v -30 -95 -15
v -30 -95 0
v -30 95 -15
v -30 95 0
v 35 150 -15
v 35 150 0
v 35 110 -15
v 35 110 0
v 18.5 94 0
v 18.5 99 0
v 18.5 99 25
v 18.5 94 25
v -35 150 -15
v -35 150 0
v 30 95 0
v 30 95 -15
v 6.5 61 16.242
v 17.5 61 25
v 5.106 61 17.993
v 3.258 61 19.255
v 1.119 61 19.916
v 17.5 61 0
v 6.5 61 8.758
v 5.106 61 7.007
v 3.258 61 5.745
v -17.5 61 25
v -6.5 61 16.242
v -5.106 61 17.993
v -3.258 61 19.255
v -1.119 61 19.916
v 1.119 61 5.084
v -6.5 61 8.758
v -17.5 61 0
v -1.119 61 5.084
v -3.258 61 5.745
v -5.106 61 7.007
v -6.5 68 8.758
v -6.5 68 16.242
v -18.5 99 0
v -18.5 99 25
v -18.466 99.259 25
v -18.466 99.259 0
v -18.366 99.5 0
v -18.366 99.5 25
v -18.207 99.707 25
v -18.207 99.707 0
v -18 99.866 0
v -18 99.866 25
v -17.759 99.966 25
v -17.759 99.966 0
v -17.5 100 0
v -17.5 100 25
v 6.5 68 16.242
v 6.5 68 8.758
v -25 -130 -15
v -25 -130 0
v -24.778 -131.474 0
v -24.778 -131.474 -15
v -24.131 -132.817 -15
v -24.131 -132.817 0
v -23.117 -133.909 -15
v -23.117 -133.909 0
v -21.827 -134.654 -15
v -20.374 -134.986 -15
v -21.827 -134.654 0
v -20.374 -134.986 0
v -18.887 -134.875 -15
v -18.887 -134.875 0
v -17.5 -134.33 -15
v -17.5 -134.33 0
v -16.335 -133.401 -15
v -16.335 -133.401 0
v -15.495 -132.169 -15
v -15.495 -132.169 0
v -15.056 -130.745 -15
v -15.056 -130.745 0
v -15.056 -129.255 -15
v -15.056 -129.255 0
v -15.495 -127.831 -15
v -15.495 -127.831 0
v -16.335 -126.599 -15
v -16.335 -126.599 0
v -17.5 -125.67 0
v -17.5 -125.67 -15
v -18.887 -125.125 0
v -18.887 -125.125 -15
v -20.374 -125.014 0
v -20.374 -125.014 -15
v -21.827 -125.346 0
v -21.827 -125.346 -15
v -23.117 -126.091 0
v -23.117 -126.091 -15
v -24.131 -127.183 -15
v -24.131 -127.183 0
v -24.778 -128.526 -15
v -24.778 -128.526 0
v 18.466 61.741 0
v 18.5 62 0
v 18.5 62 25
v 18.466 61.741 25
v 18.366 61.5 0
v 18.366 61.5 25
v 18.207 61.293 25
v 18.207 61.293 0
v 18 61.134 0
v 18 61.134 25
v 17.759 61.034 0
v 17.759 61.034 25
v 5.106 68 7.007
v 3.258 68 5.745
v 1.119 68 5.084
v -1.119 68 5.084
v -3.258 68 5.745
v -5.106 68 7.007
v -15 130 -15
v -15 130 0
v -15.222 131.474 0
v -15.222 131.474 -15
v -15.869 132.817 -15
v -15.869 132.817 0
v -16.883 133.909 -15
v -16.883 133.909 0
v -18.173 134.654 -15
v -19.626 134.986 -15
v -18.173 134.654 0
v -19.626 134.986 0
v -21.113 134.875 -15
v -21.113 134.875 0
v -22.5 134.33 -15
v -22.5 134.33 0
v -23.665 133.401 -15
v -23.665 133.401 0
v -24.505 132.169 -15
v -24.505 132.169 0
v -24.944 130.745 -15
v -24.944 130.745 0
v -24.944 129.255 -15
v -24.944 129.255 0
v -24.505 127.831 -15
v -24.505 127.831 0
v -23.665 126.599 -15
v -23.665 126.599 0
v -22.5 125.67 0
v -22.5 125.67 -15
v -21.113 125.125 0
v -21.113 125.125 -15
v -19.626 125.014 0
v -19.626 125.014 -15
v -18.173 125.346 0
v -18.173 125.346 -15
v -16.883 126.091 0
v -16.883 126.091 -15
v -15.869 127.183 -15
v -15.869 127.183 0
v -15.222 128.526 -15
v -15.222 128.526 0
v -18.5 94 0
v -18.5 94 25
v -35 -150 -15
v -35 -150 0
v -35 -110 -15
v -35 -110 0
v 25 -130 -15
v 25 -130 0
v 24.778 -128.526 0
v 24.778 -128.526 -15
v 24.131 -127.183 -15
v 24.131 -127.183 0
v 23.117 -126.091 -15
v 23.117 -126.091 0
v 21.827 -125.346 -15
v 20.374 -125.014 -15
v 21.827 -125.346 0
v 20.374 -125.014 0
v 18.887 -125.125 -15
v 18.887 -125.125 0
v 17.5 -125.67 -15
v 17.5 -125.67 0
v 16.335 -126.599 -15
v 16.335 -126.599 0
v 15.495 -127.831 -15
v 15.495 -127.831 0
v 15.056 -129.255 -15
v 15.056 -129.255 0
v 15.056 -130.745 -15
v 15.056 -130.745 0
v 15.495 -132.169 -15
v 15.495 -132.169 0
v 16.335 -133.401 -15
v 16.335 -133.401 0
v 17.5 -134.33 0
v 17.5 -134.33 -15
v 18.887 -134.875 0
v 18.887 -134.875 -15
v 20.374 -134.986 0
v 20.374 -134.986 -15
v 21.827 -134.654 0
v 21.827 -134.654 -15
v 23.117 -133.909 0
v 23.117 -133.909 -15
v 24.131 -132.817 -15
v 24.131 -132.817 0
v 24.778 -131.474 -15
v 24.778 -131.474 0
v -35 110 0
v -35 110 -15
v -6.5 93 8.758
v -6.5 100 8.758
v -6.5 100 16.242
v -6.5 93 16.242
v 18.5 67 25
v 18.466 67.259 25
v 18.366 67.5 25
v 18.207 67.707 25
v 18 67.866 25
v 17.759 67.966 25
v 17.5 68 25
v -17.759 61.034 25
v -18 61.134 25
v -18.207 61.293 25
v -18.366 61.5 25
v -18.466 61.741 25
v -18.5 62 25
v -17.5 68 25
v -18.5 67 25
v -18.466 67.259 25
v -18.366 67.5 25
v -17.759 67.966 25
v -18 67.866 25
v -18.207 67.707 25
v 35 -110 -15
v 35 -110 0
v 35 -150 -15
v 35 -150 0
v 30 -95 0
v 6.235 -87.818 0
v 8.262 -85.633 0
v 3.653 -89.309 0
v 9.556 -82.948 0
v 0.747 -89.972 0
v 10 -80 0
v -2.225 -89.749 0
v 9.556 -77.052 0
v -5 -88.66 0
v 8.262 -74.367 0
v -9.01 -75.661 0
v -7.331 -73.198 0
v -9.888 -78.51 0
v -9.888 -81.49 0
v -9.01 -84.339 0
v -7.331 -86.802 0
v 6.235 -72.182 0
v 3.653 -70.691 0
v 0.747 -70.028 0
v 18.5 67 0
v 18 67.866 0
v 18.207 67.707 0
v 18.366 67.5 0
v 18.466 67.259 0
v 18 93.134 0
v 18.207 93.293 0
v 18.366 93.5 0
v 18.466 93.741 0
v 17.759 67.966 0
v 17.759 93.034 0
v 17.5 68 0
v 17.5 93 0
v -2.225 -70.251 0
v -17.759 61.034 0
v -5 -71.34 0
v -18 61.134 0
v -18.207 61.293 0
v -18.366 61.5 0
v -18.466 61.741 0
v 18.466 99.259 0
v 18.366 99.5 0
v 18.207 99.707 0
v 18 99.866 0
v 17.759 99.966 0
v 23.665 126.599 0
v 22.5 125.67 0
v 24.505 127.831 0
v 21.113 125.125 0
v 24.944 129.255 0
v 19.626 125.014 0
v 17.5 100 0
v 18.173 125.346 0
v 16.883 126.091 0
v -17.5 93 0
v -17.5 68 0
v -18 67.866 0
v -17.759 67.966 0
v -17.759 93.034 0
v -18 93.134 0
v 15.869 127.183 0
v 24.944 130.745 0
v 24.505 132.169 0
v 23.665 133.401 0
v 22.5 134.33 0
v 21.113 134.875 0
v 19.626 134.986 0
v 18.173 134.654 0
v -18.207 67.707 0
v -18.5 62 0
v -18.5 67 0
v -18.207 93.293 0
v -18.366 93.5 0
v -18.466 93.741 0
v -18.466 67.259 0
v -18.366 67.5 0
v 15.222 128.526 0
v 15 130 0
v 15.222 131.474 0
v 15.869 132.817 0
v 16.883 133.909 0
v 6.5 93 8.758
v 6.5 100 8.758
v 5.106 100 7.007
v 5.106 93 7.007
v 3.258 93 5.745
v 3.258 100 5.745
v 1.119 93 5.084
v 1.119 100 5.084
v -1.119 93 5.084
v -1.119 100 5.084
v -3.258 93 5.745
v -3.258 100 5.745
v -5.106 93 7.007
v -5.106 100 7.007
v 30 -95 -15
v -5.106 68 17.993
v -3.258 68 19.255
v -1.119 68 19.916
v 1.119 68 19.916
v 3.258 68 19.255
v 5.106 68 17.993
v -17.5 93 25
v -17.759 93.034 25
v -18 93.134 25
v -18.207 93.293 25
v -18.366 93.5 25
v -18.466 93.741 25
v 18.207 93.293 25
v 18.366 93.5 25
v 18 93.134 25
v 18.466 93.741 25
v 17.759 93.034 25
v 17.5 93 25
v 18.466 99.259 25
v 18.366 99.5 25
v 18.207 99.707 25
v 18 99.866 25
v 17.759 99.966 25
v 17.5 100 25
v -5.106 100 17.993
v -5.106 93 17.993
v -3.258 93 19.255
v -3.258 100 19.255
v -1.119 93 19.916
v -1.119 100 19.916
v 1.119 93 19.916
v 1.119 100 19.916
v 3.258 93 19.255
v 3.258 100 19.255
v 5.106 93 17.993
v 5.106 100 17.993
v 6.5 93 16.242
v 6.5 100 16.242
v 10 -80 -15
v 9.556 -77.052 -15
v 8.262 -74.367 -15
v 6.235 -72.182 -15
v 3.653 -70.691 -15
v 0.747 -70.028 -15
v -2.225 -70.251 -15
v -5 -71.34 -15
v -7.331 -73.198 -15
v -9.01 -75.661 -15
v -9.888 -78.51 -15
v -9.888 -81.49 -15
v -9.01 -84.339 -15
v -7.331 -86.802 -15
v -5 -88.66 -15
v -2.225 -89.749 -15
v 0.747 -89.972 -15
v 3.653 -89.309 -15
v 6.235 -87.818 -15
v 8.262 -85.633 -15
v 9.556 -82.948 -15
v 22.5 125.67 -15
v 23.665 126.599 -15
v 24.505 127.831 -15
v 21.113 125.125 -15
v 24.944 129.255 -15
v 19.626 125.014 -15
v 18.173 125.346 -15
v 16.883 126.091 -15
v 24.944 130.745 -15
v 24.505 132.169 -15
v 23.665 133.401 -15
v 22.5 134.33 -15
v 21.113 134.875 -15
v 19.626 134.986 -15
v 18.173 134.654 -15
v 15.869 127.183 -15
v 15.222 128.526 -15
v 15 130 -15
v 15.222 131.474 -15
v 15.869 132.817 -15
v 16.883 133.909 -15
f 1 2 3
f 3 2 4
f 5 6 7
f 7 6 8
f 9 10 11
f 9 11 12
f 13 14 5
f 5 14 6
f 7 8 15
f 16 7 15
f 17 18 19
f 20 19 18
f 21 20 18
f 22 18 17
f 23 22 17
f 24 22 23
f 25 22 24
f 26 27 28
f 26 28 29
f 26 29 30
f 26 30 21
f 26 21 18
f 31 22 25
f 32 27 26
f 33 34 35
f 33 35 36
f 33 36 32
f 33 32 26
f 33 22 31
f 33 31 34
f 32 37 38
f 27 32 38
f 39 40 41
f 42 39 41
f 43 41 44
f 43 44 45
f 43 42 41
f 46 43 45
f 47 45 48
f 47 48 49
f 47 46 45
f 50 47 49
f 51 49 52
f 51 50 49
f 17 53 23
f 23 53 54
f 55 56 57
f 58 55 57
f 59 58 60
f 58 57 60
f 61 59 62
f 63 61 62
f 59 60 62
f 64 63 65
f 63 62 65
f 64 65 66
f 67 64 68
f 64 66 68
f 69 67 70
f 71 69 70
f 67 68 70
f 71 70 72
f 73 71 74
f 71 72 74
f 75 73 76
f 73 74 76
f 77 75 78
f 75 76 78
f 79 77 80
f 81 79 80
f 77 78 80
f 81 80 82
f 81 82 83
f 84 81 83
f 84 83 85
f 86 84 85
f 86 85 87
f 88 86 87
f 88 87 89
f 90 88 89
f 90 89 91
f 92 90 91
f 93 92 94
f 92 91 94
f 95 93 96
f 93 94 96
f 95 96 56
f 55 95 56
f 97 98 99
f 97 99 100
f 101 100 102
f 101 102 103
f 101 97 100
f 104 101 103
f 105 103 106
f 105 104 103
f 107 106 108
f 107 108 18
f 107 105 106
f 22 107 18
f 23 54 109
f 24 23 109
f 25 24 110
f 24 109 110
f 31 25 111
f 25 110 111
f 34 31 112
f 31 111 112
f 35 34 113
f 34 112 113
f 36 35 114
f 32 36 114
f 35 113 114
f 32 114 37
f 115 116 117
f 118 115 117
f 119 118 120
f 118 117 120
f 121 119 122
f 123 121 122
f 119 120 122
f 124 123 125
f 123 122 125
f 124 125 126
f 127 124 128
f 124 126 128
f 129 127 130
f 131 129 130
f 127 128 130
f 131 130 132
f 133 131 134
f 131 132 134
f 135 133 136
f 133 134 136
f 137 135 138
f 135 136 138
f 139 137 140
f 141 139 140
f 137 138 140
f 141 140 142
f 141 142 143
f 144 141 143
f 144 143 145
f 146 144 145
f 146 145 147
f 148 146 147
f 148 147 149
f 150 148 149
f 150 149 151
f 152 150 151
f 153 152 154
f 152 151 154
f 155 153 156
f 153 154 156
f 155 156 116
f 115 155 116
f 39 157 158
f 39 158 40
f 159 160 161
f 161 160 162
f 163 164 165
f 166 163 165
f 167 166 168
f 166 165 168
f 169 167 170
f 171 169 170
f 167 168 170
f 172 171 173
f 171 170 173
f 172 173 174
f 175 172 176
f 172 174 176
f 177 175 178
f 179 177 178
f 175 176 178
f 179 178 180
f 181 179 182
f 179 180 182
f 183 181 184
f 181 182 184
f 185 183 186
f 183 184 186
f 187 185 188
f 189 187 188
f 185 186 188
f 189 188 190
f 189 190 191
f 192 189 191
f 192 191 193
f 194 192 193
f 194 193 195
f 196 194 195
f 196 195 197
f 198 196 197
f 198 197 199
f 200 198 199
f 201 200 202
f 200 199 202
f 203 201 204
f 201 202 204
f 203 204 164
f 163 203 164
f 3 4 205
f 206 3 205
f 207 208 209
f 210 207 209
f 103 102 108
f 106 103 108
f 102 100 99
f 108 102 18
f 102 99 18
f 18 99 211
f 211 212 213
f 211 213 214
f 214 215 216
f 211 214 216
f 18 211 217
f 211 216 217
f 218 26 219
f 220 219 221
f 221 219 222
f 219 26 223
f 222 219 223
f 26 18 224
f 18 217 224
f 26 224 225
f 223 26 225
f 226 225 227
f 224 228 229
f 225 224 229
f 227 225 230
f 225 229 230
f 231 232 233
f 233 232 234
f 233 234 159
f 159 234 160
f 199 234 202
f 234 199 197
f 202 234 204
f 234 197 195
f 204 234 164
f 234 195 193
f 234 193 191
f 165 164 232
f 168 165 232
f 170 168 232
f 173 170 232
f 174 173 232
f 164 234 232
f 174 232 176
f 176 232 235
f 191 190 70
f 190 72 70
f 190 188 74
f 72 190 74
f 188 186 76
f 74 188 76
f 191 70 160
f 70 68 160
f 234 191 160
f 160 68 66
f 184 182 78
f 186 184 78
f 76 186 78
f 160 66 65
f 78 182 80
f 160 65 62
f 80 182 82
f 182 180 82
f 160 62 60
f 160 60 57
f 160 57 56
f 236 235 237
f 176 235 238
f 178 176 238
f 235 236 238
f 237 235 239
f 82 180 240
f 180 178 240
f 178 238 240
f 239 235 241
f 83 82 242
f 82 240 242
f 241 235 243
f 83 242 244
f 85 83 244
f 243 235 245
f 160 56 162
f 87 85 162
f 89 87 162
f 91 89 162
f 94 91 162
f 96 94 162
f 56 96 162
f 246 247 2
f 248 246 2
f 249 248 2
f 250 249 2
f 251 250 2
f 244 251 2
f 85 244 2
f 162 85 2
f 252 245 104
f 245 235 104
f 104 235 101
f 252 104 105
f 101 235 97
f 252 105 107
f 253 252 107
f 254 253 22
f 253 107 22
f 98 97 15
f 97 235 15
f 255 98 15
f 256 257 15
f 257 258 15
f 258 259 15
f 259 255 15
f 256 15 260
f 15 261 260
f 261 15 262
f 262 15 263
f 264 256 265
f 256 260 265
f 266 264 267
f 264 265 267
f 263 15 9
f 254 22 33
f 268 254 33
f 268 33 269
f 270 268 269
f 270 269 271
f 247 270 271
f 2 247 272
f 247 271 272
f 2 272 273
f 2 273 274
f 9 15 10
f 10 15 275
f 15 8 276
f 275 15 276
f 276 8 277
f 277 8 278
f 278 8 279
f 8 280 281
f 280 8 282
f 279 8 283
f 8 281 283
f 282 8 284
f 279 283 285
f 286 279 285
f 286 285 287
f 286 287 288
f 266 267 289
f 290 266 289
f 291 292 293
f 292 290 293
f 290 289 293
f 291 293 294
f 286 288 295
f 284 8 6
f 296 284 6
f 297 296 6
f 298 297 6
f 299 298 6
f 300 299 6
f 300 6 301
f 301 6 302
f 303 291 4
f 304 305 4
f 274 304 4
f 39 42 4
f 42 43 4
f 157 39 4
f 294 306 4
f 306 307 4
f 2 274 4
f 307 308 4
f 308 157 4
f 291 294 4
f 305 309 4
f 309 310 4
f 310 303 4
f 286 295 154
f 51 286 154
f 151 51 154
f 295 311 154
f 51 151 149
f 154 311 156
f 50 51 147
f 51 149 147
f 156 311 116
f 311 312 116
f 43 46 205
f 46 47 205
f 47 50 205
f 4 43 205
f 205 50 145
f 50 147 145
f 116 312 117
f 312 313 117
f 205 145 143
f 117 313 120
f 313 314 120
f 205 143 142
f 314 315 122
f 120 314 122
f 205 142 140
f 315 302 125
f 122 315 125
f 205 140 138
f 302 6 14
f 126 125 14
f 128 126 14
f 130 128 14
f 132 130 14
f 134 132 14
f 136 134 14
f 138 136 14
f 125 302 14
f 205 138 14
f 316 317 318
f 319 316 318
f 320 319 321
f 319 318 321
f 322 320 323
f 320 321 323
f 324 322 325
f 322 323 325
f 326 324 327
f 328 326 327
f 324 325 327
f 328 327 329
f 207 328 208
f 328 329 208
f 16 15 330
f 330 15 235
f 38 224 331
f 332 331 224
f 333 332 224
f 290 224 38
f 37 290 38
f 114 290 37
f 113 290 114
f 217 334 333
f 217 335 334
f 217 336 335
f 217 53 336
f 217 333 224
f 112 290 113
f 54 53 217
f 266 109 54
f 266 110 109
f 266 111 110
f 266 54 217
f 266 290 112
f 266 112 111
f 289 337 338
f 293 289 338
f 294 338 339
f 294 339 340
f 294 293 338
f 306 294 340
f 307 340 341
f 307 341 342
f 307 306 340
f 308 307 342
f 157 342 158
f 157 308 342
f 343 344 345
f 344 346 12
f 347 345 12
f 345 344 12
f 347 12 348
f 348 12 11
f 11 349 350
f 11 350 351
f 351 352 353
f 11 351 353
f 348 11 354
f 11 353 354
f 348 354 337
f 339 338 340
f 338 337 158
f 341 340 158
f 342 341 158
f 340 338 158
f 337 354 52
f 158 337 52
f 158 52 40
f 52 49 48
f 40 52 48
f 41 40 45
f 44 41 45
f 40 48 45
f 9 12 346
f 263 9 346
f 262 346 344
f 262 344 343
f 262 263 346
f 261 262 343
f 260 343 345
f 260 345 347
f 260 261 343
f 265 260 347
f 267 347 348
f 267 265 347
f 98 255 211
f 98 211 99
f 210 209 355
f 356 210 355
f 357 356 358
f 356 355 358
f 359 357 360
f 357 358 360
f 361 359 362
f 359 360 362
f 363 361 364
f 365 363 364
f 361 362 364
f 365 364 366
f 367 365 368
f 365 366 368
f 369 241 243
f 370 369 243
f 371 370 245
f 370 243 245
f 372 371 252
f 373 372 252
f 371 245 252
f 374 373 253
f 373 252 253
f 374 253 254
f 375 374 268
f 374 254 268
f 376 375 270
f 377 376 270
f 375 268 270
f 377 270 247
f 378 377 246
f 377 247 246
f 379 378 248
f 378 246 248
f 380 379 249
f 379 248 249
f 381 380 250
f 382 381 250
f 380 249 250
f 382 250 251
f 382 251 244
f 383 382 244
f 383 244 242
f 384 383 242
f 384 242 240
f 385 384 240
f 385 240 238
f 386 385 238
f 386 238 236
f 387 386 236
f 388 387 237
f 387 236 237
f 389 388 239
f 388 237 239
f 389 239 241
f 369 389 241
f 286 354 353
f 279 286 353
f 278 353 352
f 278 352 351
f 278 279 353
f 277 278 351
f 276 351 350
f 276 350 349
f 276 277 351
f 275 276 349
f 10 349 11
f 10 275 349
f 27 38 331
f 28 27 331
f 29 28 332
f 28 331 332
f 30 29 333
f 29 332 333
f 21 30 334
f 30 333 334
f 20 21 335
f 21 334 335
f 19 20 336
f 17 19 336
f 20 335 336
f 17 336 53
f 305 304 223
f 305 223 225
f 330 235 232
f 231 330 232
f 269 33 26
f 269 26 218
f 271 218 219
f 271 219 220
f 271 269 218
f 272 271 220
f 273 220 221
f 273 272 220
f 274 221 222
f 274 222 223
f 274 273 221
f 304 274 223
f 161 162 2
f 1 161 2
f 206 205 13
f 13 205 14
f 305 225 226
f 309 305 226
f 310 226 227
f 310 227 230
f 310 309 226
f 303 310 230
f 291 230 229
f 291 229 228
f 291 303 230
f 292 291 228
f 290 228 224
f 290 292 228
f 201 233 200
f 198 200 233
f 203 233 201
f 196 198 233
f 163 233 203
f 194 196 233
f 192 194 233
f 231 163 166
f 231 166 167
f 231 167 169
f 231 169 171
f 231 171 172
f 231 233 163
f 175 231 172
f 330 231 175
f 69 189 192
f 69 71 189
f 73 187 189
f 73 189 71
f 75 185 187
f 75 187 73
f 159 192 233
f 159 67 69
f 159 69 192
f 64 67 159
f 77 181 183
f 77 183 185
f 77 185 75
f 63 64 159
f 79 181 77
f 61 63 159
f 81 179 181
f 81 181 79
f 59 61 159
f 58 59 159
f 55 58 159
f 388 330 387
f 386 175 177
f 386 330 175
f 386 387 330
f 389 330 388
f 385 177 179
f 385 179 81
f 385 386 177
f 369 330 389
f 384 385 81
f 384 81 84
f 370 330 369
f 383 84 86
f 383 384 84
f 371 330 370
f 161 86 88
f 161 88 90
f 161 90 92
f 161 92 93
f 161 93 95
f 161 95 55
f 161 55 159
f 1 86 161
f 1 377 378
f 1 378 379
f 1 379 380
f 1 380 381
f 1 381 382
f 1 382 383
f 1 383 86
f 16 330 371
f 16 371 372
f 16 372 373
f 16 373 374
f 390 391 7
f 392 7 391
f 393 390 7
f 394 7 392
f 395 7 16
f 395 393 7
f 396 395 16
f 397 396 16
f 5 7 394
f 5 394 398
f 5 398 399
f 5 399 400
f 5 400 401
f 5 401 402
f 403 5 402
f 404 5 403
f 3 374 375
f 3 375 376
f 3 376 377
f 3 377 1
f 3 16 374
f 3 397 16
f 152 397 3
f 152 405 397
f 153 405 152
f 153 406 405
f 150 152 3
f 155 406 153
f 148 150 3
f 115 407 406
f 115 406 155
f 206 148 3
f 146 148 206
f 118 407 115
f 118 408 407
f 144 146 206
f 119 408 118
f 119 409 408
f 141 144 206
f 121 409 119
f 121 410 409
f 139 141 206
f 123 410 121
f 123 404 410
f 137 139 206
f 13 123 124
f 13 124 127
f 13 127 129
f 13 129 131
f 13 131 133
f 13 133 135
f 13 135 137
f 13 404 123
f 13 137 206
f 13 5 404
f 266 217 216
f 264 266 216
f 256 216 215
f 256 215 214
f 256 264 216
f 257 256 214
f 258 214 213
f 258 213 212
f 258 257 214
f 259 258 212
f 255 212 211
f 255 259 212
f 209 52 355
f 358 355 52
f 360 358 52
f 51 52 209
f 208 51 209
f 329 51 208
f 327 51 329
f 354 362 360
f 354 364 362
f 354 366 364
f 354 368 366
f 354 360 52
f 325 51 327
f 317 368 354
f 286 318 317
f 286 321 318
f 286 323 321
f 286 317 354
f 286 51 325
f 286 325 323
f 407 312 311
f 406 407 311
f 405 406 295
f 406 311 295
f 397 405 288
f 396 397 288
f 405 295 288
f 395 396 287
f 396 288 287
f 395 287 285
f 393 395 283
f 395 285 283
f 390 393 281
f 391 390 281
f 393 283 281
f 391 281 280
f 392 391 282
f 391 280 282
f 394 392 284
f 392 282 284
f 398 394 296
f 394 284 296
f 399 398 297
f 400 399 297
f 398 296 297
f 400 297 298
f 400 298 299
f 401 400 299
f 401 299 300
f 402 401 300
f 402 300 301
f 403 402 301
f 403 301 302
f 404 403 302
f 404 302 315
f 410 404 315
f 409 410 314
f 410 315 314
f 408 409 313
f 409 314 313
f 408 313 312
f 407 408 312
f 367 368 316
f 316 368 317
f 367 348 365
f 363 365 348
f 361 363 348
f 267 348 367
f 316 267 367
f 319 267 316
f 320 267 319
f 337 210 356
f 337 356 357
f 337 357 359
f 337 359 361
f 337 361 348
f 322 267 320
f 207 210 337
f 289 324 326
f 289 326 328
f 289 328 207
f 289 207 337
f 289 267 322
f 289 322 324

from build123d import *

# Parameters (mm, degrees)
BOSS_EXTRUDE1_DEPTH = 15
SKETCH1_3_R         = 5
SKETCH1_3_R_2       = 10
CUT_EXTRUDE1_DEPTH  = 15
BOSS_EXTRUDE2_DEPTH = 25
CUT_EXTRUDE3_DEPTH  = 254.673017879


with BuildPart() as part:
    # Sketch1 → Boss-Extrude1 (new body)
    with BuildSketch(Plane.XY):
        Polygon((-35, 150), (35, 150), (35, 110), (30, 95), (30, -95), (35, -110), (35, -150), (-35, -150), (-35, -110), (-30, -95), (-30, 95), (-35, 110), align=None)
    extrude(amount=-BOSS_EXTRUDE1_DEPTH)

    # Sketch1<3> → Cut-Extrude1 (cut)
    with BuildSketch(Plane.XY):
        with Locations((-20, 130)):
            Circle(SKETCH1_3_R)
        with Locations((20, 130)):
            Circle(SKETCH1_3_R)
        with Locations((0, -80)):
            Circle(SKETCH1_3_R_2)
        with Locations((20, -130)):
            Circle(SKETCH1_3_R)
        with Locations((-20, -130)):
            Circle(SKETCH1_3_R)
    extrude(amount=-CUT_EXTRUDE1_DEPTH, mode=Mode.SUBTRACT)

    # Sketch1<4> → Boss-Extrude2 (add)
    with BuildSketch(Plane.XY):
        with BuildLine():
            Line((-17.5, 100), (17.5, 100))
            ThreePointArc((17.5, 100), (18.207106781, 99.707106781), (18.5, 99))
            Line((18.5, 99), (18.5, 94))
            ThreePointArc((18.5, 94), (18.207106781, 93.292893219), (17.5, 93))
            Line((17.5, 93), (-17.5, 93))
            ThreePointArc((-17.5, 93), (-18.207106781, 93.292893219), (-18.5, 94))
            Line((-18.5, 94), (-18.5, 99))
            ThreePointArc((-18.5, 99), (-18.207106781, 99.707106781), (-17.5, 100))
        make_face()
        with BuildLine():
            Line((-17.5, 68), (17.5, 68))
            ThreePointArc((17.5, 68), (18.207106781, 67.707106781), (18.5, 67))
            Line((18.5, 67), (18.5, 62))
            ThreePointArc((18.5, 62), (18.207106781, 61.292893219), (17.5, 61))
            Line((17.5, 61), (-17.5, 61))
            ThreePointArc((-17.5, 61), (-18.207106781, 61.292893219), (-18.5, 62))
            Line((-18.5, 62), (-18.5, 67))
            ThreePointArc((-18.5, 67), (-18.207106781, 67.707106781), (-17.5, 68))
        make_face()
    extrude(amount=BOSS_EXTRUDE2_DEPTH)

    # Sketch2 → Cut-Extrude3 (cut, through all)
    with BuildSketch(Plane(origin=(0, 100, 0), x_dir=(1, 0, 0), z_dir=(0, 1, 0))):
        with BuildLine():
            Line((-6.5, -8.758342613), (-6.5, -16.241657387))
            ThreePointArc((-6.5, -16.241657387), (0, -20), (6.5, -16.241657387))
            Line((6.5, -16.241657387), (6.5, -8.758342613))
            ThreePointArc((6.5, -8.758342613), (0, -5), (-6.5, -8.758342613))
        make_face()
    extrude(amount=-CUT_EXTRUDE3_DEPTH, mode=Mode.SUBTRACT)


solid = part.part
